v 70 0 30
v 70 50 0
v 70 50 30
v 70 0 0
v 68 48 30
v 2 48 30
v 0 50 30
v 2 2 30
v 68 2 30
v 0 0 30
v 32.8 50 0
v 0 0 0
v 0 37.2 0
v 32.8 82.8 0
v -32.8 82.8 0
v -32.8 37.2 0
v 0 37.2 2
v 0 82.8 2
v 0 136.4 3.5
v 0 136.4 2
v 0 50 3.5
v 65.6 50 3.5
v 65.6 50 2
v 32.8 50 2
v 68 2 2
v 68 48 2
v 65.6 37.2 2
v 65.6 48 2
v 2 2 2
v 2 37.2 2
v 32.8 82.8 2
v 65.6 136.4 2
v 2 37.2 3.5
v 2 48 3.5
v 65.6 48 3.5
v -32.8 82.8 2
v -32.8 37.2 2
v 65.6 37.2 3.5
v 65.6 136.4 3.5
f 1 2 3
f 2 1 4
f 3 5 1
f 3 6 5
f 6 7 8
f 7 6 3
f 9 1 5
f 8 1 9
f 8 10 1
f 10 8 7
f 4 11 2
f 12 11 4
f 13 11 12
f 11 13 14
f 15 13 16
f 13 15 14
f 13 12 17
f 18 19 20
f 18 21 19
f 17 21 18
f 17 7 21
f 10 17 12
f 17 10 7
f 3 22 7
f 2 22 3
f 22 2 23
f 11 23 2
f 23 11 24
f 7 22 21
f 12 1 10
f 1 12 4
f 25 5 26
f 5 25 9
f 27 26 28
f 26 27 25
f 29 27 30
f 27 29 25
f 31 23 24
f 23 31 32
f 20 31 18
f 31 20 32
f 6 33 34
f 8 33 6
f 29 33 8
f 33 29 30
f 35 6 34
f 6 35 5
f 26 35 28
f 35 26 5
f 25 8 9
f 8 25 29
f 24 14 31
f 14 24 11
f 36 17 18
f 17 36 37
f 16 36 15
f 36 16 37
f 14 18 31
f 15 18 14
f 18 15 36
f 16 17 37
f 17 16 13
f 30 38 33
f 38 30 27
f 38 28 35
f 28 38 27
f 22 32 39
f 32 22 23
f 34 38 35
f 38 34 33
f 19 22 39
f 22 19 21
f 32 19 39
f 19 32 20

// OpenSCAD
// Two-part enclosure for a small electronics board (e.g. an Arduino-based temperature logger).
// Both parts print together on the bed with a 10 mm gap between them.
// NOVEL general part (a generic box with a matching lid) - not a part any one lab ordered.
//

box_x   = 70;
box_y   = 50;
box_z   = 30;
wall    = 2;
floor   = 2;
lip_t   = 1.5;
lip_h   = 4;
lip_x   = 65.6;
lip_y   = 45.6;
clearance = 0.2;

$fn = 32;

gap = 10;

module box() {
    difference() {
        cube([box_x, box_y, box_z]);
        translate([wall, wall, wall]) cube([box_x - 2 * wall, box_y - 2 * wall, box_z - floor]);   // hollow, open top
    }
}

module lid() {
    plate_t = 2;
    union() {
        translate([-lip_x / 2, -lip_y / 2, 0]) cube([lip_x, lip_y, plate_t]);                 // plate
        translate([-lip_x / 2, -lip_y / 2, 0]) cube([lip_x, lip_y, lip_t]);                   // top wall
        translate([0, -lip_y / 2, plate_t]) cube([lip_x, lip_y + 2 * lip_h, lip_t]);           // front lip
        translate([0, lip_y / 2, plate_t]) cube([lip_x, lip_y + 2 * lip_h, lip_t]);           // rear lip
    }
}

box();
translate([0, box_y + gap, 0]) lid();
